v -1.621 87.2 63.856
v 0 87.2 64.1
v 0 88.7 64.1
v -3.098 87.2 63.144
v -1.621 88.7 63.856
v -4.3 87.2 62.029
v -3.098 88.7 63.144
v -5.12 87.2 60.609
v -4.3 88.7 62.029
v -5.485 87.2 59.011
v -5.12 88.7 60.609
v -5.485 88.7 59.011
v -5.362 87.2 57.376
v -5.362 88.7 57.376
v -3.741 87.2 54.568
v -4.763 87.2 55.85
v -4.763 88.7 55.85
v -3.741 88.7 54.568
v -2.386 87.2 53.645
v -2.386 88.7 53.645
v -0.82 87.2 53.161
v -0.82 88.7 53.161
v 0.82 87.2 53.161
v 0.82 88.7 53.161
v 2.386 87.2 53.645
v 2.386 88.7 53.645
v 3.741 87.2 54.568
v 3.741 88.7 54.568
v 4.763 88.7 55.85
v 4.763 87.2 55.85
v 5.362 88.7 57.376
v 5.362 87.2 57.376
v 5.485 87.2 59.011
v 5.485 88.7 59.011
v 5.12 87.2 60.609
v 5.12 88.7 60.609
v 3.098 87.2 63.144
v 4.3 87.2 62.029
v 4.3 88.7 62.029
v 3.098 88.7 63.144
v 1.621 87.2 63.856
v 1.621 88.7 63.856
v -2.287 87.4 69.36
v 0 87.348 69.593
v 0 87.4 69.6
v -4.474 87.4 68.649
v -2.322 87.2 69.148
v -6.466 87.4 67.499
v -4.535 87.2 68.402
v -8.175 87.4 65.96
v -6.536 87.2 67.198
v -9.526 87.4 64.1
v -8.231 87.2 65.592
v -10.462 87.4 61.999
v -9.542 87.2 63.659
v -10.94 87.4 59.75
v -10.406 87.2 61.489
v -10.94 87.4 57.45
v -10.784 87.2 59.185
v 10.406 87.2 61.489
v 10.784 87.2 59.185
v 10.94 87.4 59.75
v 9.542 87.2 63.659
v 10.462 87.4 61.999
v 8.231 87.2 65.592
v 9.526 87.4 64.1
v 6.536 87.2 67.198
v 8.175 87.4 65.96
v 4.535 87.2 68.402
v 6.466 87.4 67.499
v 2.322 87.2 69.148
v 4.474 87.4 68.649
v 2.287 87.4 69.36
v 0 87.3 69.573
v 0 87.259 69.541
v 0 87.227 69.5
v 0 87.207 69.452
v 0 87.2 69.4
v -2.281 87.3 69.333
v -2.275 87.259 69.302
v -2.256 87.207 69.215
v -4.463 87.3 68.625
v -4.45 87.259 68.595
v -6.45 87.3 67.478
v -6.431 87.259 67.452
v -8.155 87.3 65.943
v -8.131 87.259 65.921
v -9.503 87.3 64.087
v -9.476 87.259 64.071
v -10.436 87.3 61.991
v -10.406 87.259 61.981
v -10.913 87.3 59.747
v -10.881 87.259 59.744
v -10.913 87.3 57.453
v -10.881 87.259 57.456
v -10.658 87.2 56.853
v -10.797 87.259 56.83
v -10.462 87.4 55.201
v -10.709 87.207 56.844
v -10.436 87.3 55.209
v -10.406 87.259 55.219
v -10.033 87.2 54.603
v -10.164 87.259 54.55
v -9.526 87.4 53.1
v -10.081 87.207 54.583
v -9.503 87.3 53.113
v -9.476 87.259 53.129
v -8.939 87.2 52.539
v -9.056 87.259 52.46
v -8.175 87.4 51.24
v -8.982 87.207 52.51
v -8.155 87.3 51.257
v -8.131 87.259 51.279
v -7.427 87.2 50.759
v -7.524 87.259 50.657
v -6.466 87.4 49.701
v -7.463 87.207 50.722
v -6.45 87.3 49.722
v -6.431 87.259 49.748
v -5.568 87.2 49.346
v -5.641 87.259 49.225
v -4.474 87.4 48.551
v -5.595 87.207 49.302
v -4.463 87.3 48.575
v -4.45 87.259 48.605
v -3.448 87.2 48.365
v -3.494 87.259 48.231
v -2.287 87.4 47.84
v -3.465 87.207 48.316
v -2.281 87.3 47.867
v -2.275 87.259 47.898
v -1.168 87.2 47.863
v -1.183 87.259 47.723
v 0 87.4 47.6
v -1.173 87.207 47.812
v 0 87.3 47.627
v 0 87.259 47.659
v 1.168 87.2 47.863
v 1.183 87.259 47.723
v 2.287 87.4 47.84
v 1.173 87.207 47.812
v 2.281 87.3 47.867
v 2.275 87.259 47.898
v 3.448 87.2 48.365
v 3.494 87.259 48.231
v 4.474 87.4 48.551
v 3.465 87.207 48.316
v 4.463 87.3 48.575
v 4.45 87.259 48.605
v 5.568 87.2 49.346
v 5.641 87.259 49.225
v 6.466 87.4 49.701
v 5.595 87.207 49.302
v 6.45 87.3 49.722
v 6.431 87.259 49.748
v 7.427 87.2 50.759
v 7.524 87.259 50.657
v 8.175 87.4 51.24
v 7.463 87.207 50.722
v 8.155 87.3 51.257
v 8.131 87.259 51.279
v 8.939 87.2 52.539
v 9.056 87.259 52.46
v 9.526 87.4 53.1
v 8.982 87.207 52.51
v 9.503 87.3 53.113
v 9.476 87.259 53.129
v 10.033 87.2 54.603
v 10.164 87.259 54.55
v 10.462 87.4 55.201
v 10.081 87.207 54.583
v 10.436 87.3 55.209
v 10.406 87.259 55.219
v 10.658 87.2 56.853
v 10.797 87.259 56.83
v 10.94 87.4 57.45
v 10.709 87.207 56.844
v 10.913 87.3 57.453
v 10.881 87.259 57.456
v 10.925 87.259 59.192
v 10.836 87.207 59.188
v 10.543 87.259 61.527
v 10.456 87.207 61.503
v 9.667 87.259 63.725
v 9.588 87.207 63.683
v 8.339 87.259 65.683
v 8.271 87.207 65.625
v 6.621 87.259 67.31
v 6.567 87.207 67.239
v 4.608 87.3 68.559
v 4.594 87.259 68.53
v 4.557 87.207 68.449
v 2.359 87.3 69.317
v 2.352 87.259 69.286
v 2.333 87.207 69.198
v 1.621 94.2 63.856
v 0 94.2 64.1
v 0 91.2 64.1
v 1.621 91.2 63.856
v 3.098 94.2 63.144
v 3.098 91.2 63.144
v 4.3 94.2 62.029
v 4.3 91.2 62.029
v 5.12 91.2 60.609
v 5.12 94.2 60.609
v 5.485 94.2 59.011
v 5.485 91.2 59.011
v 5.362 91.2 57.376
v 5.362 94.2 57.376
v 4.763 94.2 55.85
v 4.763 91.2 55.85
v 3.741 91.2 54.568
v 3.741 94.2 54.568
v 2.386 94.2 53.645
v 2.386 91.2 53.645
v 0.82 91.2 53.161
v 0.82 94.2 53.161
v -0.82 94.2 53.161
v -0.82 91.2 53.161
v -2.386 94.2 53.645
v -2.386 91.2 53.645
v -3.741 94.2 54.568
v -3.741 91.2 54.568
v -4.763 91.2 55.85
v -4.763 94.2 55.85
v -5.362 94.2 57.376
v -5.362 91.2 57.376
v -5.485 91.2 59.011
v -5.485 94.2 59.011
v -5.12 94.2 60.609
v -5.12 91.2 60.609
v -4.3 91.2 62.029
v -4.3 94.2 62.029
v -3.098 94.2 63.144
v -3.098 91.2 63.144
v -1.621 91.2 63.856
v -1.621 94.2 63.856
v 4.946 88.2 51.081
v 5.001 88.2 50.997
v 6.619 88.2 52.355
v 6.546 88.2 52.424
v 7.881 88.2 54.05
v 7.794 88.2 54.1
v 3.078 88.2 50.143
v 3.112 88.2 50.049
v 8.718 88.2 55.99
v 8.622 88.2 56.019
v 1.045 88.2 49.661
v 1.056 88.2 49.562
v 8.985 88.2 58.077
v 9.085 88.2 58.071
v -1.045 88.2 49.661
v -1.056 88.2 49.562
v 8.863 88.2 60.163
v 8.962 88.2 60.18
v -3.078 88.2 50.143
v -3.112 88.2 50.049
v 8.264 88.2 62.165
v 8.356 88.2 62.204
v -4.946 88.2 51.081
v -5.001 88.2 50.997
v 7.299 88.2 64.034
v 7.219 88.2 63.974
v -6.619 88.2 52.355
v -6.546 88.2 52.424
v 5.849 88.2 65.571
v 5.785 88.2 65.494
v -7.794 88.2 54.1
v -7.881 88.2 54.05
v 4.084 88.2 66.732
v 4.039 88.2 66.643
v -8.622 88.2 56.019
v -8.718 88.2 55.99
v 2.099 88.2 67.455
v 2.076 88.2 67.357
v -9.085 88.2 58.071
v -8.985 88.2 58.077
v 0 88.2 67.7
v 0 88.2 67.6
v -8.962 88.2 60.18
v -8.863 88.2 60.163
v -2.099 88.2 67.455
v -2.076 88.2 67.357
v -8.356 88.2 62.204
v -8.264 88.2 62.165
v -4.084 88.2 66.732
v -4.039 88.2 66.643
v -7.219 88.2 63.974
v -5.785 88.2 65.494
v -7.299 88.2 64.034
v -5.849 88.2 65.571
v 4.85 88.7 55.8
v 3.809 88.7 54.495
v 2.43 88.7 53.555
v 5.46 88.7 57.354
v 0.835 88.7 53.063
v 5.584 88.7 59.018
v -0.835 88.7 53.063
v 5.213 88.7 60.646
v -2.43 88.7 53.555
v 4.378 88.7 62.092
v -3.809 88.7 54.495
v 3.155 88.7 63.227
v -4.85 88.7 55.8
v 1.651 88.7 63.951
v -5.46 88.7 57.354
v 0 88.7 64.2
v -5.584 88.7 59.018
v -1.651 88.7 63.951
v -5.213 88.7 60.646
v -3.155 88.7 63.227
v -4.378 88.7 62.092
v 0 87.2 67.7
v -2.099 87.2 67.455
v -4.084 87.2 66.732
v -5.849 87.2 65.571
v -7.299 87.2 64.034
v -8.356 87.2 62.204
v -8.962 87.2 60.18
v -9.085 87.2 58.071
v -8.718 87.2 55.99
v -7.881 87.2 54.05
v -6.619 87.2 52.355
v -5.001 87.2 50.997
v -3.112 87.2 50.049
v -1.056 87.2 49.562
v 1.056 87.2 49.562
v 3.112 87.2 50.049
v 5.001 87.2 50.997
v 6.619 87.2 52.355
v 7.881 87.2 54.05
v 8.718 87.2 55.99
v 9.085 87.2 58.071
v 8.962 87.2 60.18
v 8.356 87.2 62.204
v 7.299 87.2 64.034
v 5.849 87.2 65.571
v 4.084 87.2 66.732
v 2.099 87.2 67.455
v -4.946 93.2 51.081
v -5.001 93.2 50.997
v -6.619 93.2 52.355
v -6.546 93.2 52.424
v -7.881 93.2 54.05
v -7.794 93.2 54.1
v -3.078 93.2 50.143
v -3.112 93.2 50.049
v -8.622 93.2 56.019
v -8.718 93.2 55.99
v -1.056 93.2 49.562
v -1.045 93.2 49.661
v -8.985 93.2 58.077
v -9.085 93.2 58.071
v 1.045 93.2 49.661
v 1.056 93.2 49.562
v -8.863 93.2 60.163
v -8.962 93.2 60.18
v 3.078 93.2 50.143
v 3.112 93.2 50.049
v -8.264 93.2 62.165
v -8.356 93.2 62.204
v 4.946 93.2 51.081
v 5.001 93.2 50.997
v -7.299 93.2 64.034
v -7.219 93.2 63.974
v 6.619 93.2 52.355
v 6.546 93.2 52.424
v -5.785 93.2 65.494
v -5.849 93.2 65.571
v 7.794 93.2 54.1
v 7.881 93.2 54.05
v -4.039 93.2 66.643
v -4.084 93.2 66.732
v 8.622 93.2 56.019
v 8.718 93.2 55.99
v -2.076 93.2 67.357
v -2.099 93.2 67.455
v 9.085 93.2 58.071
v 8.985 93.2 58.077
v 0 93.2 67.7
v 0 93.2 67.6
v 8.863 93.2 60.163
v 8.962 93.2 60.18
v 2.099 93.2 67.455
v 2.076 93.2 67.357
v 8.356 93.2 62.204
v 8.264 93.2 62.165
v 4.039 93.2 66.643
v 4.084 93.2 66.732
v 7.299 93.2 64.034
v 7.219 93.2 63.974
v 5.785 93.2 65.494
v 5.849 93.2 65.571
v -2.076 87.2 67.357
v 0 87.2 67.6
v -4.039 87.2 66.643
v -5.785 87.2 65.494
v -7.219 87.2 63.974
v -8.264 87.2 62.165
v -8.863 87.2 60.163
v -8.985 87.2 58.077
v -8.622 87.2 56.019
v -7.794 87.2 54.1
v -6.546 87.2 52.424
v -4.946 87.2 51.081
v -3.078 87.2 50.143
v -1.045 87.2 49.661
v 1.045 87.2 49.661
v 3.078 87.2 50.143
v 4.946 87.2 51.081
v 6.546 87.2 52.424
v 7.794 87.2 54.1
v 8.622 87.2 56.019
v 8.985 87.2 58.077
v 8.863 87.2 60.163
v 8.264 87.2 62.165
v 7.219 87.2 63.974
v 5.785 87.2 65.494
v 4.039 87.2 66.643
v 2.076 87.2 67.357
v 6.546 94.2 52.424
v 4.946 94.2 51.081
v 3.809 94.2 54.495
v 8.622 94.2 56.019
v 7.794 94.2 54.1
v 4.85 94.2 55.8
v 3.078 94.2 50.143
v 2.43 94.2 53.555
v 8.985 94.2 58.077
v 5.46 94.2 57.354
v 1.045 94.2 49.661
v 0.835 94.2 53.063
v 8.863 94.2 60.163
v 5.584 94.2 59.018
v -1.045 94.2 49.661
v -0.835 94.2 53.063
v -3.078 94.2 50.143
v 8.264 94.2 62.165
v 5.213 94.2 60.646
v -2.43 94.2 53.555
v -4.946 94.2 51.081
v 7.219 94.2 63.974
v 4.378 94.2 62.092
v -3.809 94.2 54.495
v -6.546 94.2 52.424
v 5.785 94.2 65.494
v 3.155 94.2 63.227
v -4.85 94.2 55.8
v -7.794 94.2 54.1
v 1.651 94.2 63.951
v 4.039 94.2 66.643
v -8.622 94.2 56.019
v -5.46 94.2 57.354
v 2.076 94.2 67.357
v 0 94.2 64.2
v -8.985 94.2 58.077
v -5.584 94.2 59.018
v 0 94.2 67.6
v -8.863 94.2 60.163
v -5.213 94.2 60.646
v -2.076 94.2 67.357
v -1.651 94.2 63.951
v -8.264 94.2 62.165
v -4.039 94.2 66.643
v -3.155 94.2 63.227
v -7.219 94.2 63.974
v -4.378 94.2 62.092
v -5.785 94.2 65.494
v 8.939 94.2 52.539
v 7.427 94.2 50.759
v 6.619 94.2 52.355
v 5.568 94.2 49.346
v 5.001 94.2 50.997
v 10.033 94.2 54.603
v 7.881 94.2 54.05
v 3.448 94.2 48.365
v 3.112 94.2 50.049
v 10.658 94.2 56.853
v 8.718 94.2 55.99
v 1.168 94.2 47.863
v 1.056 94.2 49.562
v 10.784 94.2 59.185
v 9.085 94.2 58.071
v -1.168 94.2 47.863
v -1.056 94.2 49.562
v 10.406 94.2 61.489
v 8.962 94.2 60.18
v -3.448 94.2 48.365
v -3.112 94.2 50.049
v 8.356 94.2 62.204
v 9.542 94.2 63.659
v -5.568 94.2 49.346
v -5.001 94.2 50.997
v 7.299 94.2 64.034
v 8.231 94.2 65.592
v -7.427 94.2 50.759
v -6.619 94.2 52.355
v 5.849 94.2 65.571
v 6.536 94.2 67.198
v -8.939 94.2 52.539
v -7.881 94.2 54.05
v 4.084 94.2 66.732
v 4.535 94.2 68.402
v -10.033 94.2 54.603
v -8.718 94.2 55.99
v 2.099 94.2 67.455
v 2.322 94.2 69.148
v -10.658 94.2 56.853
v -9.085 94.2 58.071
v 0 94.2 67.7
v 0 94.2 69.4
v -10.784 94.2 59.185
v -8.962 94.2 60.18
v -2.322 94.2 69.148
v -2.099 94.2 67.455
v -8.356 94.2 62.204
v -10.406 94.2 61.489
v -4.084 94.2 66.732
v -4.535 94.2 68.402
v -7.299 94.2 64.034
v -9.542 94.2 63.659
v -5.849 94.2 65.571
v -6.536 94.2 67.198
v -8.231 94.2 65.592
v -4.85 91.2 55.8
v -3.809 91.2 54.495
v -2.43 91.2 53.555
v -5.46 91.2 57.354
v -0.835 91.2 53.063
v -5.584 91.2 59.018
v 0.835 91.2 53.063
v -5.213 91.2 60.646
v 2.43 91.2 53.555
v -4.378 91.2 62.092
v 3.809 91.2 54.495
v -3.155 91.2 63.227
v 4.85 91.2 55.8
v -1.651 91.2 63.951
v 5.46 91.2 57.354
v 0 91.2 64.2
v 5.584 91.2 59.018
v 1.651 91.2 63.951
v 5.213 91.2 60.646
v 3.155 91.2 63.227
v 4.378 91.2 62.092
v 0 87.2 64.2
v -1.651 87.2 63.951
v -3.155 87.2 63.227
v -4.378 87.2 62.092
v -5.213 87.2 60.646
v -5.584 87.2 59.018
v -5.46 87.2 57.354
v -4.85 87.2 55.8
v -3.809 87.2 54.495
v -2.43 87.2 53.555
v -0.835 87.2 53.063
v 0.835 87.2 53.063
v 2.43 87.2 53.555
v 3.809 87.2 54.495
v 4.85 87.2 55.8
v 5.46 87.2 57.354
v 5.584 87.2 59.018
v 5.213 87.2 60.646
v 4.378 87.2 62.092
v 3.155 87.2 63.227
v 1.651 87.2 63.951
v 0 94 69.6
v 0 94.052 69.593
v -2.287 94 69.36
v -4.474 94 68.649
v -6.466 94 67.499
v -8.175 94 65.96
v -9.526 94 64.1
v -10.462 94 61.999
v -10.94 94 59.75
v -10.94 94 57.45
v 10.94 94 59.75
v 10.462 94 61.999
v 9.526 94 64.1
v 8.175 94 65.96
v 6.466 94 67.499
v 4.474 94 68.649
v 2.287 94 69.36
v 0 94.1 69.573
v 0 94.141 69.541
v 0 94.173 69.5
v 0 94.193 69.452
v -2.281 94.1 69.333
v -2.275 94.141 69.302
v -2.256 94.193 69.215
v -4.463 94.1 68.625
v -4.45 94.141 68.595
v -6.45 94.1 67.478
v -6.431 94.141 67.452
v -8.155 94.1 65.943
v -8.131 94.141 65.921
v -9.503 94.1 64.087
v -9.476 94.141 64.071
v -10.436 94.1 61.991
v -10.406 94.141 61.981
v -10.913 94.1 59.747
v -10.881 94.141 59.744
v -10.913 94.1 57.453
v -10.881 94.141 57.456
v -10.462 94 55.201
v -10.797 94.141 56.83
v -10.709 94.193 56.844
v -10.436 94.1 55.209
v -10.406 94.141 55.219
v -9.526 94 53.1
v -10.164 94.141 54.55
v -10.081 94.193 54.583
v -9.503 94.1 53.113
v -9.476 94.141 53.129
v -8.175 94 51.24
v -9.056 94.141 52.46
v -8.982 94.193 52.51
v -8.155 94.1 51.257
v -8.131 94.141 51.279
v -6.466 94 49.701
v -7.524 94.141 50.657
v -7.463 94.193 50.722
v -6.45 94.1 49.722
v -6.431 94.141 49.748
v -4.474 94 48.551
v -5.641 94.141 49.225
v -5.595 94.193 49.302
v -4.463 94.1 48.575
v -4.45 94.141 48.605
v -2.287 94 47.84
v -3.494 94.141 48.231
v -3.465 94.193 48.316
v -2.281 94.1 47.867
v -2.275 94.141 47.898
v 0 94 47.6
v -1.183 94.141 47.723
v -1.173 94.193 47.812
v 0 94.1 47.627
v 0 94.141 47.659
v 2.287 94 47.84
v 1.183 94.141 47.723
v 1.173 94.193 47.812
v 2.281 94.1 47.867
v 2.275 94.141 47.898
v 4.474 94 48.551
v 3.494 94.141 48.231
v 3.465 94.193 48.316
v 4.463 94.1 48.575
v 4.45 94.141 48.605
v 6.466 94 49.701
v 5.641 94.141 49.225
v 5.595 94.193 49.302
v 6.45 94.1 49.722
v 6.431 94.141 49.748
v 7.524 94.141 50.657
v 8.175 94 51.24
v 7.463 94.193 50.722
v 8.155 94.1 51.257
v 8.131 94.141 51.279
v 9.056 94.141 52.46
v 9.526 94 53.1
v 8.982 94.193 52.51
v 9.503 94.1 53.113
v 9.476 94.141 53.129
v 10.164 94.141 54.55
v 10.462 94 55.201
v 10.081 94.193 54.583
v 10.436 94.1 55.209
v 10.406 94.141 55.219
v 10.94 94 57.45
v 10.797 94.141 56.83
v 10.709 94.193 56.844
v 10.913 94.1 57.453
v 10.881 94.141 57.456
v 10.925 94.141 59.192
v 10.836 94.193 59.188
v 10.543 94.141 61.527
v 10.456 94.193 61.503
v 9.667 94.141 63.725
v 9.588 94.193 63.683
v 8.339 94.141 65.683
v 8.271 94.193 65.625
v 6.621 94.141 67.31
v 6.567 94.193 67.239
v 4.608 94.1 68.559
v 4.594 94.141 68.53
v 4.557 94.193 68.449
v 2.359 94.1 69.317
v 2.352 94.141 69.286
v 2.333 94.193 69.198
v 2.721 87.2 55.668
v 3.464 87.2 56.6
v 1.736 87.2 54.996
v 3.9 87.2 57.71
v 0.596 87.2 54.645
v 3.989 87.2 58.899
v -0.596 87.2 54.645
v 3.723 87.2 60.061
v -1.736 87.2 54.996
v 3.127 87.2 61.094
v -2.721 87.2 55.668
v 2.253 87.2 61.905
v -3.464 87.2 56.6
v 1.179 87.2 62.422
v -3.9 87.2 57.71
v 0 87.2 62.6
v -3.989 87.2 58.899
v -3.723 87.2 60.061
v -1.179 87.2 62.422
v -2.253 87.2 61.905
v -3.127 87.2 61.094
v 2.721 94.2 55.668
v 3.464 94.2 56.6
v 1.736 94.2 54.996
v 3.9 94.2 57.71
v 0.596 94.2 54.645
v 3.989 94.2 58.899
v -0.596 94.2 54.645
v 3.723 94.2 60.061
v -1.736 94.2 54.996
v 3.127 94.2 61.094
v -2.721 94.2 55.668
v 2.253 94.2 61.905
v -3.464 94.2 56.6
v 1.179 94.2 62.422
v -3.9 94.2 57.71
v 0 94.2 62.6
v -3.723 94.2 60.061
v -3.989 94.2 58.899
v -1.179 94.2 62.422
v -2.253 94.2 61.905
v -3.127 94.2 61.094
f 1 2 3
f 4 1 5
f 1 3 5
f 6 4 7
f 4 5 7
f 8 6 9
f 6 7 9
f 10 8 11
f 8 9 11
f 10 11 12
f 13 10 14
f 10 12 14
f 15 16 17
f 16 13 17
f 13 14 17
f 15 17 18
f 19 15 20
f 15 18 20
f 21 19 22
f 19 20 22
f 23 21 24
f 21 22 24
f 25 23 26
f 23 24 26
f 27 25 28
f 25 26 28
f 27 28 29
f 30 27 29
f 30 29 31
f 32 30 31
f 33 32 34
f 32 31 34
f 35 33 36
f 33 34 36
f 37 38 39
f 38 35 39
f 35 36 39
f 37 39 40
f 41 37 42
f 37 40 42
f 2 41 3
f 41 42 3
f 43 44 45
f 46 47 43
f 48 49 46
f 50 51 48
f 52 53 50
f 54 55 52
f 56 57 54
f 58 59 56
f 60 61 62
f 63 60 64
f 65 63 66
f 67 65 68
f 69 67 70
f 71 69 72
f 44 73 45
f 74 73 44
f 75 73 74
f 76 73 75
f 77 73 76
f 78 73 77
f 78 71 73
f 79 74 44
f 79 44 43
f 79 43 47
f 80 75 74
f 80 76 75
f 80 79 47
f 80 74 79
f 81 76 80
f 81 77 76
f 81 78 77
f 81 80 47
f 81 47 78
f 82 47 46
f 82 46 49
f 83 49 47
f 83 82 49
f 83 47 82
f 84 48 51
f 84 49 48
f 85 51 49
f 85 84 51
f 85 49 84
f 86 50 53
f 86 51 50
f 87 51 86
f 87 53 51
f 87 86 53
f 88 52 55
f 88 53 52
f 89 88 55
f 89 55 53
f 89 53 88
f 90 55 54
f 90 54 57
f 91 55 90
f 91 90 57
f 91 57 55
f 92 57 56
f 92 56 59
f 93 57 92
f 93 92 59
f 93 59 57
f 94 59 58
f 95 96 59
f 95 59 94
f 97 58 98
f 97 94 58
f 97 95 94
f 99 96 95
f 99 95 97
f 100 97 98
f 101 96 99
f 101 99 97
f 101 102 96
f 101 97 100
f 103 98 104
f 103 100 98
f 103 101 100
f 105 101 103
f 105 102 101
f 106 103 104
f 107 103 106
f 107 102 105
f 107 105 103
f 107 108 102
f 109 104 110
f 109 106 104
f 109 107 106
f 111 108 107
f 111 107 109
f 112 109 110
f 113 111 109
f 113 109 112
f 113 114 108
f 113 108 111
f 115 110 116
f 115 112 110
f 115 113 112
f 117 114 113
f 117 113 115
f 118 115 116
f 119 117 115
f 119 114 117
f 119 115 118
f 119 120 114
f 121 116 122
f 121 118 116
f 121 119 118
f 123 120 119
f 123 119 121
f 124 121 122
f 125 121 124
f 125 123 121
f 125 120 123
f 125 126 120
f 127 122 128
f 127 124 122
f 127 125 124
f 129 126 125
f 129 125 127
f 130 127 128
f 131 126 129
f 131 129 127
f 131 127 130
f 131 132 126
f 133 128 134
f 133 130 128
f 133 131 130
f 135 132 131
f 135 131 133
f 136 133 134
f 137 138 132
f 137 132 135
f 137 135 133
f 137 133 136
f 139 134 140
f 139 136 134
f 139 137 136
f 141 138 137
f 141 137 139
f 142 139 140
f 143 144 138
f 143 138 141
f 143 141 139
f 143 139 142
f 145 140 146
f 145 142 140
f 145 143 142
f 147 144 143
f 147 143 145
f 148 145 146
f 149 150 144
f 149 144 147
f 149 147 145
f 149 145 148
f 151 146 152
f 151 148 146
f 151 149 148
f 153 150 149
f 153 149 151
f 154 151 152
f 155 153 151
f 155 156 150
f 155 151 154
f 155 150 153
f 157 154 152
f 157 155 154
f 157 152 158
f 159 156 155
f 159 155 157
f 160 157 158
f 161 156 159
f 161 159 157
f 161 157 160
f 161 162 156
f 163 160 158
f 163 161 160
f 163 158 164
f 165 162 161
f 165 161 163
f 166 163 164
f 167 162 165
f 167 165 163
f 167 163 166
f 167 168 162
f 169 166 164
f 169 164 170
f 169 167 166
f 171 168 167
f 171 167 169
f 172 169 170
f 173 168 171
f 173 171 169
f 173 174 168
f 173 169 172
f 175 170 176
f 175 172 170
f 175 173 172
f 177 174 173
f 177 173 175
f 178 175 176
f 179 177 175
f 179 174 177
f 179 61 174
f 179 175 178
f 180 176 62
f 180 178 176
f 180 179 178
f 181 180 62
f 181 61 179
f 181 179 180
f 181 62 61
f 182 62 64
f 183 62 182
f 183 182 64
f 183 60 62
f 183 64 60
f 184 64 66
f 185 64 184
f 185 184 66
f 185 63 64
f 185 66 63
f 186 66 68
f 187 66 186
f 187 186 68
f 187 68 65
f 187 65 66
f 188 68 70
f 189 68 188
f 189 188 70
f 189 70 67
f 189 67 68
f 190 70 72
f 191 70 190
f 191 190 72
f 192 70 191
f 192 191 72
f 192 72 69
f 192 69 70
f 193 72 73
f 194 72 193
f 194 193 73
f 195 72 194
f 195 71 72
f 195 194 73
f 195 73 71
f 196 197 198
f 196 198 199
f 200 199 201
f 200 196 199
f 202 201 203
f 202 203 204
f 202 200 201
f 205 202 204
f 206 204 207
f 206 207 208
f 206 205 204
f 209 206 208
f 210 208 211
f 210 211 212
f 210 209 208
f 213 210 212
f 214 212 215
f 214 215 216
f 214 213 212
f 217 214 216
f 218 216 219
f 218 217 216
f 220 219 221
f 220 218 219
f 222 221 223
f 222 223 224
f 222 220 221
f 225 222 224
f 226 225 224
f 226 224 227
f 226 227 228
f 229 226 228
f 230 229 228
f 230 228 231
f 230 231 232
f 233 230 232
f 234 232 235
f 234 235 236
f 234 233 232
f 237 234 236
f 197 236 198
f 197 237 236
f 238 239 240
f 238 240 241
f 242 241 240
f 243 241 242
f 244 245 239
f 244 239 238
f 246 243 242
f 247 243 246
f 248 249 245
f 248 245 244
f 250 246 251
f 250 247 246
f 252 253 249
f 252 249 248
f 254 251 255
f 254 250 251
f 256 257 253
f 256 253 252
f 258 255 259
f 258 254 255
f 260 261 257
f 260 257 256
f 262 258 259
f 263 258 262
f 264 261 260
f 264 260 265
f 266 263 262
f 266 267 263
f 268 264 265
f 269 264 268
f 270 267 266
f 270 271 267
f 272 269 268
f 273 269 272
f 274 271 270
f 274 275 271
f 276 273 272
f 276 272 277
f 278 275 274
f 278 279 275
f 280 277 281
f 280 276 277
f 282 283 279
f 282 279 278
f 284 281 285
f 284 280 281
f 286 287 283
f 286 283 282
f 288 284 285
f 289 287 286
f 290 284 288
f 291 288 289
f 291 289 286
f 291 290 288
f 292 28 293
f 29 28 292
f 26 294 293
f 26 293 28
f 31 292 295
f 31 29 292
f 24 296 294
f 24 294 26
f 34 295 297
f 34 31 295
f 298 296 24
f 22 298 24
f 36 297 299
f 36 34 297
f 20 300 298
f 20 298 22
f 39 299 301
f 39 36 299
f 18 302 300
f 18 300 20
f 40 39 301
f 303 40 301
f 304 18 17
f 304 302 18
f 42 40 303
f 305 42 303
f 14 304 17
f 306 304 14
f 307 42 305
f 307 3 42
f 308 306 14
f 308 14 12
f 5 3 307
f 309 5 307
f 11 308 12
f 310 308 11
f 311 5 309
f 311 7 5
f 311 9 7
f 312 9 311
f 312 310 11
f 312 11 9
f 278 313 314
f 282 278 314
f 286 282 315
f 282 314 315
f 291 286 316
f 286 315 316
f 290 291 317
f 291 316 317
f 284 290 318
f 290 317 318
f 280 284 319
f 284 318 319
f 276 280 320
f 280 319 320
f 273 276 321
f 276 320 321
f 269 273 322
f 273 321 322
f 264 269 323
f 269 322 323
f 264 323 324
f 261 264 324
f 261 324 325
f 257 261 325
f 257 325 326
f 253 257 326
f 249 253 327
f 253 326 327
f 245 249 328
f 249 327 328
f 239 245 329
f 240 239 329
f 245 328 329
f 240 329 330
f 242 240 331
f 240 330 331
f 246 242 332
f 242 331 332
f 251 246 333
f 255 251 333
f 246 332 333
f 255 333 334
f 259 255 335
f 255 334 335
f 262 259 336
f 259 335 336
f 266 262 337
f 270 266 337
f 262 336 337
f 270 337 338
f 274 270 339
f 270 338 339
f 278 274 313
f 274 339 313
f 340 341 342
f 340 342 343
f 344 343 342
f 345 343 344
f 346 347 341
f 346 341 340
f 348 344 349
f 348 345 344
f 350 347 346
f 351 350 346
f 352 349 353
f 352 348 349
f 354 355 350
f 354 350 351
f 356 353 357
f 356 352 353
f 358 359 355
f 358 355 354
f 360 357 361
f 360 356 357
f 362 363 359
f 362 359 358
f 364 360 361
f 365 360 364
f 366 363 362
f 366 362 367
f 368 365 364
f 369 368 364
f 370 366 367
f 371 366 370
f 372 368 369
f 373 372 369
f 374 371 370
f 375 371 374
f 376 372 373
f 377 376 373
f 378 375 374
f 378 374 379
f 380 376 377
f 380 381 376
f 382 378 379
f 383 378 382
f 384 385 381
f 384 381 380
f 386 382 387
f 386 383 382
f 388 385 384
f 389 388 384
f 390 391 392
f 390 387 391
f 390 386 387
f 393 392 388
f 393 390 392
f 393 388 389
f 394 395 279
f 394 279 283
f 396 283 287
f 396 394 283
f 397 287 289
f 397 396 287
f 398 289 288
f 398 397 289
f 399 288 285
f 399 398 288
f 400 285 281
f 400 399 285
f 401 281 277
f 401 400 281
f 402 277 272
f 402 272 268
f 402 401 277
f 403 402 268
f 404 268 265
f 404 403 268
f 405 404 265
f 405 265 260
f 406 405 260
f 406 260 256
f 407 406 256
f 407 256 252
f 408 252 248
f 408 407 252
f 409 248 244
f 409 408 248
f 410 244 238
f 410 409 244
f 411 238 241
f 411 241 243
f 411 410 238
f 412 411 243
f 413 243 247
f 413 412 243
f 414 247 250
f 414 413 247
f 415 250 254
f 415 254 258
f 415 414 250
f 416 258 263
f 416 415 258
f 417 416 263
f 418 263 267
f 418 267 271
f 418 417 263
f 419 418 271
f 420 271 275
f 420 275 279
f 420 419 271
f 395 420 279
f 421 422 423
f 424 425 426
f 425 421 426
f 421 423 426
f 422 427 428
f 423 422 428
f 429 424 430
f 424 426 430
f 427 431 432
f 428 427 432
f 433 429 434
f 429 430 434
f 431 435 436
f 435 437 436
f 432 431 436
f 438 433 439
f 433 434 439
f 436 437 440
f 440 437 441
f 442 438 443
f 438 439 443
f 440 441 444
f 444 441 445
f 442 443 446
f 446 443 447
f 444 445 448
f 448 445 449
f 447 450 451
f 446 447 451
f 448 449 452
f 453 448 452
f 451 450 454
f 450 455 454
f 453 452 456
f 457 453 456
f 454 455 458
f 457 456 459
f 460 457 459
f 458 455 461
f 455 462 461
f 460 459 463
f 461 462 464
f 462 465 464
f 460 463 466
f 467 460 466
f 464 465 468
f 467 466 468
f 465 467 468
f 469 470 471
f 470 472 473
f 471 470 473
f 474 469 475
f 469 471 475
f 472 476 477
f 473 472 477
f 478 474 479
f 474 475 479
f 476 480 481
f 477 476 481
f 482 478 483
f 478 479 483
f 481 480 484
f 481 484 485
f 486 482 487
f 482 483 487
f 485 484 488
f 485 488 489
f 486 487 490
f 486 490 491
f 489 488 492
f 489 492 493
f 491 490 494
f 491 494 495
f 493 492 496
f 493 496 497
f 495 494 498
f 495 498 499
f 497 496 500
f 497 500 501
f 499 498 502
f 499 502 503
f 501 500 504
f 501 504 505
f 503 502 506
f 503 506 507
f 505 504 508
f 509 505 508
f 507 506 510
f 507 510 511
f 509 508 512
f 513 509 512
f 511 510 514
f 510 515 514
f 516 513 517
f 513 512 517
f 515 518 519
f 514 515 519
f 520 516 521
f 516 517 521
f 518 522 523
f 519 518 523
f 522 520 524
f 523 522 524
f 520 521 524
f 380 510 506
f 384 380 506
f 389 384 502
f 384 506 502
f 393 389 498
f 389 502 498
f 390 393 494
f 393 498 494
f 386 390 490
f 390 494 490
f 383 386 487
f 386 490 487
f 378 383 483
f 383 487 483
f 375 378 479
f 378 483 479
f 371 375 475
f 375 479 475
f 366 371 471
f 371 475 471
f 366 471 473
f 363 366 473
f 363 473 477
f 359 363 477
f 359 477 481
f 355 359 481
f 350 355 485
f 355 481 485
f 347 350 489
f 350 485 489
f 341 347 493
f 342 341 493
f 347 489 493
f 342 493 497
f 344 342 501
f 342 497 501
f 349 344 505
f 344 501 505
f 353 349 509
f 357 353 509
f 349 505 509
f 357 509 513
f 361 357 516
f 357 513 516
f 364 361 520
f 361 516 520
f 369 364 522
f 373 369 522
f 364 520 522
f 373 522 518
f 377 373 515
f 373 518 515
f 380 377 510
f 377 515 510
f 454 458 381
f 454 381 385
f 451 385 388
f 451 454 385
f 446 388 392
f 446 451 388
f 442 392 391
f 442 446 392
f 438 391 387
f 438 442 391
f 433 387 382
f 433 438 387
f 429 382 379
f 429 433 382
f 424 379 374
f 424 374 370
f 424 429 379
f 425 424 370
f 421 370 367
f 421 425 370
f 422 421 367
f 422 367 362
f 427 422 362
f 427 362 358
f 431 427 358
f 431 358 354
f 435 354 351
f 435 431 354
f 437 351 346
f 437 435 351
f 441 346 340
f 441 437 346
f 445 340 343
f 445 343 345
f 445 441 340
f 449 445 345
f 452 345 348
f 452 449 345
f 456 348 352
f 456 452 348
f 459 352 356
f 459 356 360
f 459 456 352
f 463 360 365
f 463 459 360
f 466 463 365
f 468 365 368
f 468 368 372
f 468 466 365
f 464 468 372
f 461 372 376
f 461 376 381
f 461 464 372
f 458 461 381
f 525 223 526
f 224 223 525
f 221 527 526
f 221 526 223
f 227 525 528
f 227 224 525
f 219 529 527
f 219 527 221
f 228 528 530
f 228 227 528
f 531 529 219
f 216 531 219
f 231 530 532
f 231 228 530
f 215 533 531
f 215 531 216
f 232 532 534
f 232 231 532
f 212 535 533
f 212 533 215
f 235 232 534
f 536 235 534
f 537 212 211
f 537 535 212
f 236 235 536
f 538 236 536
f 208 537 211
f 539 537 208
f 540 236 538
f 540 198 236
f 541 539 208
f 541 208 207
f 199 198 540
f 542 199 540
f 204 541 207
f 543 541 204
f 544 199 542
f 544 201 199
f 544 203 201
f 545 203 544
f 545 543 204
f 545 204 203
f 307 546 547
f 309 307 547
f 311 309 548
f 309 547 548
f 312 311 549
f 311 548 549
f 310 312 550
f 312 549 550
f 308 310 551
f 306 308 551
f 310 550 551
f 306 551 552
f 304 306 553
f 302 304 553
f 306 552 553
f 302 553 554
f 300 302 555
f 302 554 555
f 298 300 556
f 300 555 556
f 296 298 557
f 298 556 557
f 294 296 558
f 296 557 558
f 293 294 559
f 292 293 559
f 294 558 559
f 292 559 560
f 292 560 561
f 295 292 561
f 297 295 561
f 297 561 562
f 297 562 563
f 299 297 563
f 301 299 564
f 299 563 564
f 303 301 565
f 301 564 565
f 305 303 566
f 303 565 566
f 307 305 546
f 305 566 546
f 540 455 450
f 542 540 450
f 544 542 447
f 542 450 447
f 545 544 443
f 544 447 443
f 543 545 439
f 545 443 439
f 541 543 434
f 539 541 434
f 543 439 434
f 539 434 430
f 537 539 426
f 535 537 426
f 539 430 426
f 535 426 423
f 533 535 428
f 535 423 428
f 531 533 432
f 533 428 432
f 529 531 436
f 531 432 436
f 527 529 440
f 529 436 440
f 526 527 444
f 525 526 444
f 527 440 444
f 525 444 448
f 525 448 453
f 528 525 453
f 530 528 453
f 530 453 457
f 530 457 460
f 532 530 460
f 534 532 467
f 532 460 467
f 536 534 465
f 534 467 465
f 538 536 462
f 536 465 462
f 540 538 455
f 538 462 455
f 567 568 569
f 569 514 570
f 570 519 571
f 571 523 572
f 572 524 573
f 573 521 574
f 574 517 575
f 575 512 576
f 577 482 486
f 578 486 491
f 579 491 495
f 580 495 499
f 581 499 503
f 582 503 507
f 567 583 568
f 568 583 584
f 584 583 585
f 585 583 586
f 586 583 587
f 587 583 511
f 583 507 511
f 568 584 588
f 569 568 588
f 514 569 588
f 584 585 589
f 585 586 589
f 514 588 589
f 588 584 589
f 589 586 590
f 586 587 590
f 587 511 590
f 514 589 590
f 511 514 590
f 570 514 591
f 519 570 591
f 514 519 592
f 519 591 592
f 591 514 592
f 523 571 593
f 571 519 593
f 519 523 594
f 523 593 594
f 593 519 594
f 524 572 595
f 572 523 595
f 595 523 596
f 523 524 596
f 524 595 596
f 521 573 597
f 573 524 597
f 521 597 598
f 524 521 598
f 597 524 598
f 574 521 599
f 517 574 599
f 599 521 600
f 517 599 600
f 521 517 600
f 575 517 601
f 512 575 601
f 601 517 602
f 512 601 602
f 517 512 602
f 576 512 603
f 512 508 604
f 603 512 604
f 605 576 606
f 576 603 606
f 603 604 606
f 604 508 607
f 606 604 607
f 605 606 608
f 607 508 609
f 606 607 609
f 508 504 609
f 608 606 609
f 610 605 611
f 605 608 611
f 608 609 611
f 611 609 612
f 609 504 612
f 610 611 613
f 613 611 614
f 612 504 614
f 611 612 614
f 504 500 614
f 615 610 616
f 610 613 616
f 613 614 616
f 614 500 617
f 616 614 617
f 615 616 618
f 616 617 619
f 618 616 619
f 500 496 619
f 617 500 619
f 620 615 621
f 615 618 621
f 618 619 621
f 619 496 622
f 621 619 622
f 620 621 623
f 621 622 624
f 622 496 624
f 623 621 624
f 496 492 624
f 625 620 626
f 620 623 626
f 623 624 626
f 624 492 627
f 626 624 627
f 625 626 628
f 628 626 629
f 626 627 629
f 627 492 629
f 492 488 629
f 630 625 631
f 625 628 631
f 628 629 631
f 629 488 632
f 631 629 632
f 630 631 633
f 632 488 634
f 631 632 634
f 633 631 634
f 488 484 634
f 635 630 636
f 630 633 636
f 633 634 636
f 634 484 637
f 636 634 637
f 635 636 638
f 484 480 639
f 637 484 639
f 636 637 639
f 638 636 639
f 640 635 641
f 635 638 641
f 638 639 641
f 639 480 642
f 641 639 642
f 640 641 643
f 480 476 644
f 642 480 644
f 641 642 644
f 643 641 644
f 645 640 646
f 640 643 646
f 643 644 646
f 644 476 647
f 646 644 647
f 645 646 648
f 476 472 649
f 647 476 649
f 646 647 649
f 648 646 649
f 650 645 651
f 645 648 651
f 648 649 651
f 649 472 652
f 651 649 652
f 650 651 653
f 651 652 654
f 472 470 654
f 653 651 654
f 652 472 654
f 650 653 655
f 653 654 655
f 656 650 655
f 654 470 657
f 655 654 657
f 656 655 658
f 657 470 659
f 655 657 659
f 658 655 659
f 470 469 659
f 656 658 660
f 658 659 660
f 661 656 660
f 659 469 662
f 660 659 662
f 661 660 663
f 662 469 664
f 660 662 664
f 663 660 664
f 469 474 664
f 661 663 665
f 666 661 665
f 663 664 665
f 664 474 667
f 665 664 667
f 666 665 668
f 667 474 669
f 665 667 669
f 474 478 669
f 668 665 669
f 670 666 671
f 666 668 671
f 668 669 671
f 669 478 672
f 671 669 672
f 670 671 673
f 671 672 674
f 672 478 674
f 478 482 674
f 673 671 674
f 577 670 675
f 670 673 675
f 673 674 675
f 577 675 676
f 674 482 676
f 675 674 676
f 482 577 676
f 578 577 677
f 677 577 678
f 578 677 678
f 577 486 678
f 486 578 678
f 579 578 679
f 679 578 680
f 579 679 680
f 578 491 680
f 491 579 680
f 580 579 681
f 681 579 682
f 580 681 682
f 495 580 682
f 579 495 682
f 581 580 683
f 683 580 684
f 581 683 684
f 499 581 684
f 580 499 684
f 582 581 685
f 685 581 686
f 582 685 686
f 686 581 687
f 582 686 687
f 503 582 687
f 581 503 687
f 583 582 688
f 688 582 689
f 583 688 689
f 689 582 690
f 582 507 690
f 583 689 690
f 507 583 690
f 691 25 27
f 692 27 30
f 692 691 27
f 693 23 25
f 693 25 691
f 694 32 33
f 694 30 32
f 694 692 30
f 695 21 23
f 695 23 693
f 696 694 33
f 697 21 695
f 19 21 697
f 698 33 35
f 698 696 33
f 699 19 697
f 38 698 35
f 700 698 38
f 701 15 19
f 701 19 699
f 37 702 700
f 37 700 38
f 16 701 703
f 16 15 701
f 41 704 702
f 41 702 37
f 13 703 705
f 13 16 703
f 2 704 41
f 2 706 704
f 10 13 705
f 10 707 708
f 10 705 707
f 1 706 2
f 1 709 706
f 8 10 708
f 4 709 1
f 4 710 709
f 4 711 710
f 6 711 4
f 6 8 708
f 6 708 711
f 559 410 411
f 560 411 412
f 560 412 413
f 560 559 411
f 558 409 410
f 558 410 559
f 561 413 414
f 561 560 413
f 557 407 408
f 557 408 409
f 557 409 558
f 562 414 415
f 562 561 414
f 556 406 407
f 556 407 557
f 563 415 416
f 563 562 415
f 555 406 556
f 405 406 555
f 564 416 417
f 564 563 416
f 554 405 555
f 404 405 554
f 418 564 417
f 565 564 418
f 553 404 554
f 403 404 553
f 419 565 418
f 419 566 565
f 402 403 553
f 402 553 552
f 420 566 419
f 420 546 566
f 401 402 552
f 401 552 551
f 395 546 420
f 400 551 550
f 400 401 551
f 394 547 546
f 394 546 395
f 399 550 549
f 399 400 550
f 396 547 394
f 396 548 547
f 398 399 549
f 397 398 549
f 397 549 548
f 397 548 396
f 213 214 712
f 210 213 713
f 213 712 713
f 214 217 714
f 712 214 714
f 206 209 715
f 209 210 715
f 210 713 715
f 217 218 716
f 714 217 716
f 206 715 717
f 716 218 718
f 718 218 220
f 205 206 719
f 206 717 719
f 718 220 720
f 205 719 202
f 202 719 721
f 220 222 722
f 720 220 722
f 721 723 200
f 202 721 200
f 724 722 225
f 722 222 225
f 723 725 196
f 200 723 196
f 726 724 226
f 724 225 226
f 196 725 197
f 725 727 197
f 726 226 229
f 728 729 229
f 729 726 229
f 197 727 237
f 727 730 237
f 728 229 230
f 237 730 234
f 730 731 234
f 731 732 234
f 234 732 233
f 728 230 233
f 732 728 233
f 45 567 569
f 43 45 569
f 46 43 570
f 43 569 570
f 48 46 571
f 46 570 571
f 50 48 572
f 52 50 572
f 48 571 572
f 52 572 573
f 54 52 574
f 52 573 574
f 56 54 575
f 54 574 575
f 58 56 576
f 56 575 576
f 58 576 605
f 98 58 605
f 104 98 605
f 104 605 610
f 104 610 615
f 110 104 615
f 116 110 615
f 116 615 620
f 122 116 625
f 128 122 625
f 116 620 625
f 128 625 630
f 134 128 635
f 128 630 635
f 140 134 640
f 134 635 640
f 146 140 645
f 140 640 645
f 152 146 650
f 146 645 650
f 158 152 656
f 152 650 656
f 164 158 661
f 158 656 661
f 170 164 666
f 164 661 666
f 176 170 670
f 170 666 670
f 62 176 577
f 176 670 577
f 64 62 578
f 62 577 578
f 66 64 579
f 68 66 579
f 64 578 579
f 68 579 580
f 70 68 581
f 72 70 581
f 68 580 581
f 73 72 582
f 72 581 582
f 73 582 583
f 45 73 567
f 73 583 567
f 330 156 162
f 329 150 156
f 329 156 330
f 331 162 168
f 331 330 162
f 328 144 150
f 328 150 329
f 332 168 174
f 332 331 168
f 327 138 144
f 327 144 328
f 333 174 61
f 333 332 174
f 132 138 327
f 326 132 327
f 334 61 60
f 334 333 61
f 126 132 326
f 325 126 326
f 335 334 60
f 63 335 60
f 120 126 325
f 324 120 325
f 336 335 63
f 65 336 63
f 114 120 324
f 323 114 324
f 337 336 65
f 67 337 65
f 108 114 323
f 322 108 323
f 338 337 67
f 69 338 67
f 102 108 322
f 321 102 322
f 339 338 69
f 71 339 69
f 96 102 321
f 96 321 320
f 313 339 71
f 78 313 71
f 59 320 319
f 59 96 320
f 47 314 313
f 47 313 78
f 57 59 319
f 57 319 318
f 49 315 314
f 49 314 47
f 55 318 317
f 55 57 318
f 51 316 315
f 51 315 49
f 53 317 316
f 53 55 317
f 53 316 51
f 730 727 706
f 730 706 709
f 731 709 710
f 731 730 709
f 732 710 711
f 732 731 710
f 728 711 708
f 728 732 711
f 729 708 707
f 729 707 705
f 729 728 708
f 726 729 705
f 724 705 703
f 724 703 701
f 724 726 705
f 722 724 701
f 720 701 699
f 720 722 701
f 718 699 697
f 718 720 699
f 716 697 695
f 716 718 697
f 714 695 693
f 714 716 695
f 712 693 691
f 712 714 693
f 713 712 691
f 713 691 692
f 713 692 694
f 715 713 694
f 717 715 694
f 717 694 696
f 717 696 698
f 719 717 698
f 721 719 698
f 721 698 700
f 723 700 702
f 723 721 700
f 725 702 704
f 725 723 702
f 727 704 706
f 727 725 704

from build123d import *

# Parameters (mm, degrees)
SKETCH033_R             = 11
SKETCH033_R_2           = 4
PAD012_DEPTH            = 7
SKETCH035_R             = 5.6
SKETCH035_R_2           = 5.5
POCKET016_DEPTH         = 1.5
SKETCH034_R             = 5.6
SKETCH034_R_2           = 5.5
POCKET019_DEPTH         = 3
SKETCH032_R             = 9.1
SKETCH032_R_2           = 9
POCKET018_DEPTH         = 1
SKETCH031_R             = 9.1
SKETCH031_R_2           = 9
POCKET017_DEPTH         = 1
FILLET002_R             = 0.2
BODY008_PITCH_ANGLE     = -90
BODY008_PLACEMENT_ANGLE = 90


with BuildPart() as part:
    # Sketch033 → Pad012 (new body)
    with BuildSketch(Plane.XY):
        Circle(SKETCH033_R)
        Circle(SKETCH033_R_2, mode=Mode.SUBTRACT)
    extrude(amount=PAD012_DEPTH)

    # Sketch035 (on Face4 of Pad012) → Pocket016 (cut, symmetric)
    with BuildSketch(Plane.XY.offset(7)):
        Circle(SKETCH035_R)
        Circle(SKETCH035_R_2, mode=Mode.SUBTRACT)
    extrude(amount=POCKET016_DEPTH, both=True, mode=Mode.SUBTRACT)

    # Sketch034 (on Face2 of Pocket016) → Pocket019 (cut)
    with BuildSketch(Plane(origin=(0, 0, 0), x_dir=(1, 0, 0), z_dir=(0, 0, -1))):
        Circle(SKETCH034_R)
        Circle(SKETCH034_R_2, mode=Mode.SUBTRACT)
    extrude(amount=-POCKET019_DEPTH, mode=Mode.SUBTRACT)

    # Sketch032 (on Face3 of Pocket019) → Pocket018 (cut)
    with BuildSketch(Plane.XY.offset(7)):
        Circle(SKETCH032_R)
        Circle(SKETCH032_R_2, mode=Mode.SUBTRACT)
    extrude(amount=-POCKET018_DEPTH, mode=Mode.SUBTRACT)

    # Sketch031 (on Face2 of Pocket018) → Pocket017 (cut)
    with BuildSketch(Plane(origin=(0, 0, 0), x_dir=(1, 0, 0), z_dir=(0, 0, -1))):
        Circle(SKETCH031_R)
        Circle(SKETCH031_R_2, mode=Mode.SUBTRACT)
    extrude(amount=-POCKET017_DEPTH, mode=Mode.SUBTRACT)

    # Fillet002
    fillet002_edges = [part.edges().sort_by_distance(p)[0] for p in [
        (-11, 0, 0),
        (-11, 0, 7),
    ]]
    fillet(fillet002_edges, radius=FILLET002_R)


with BuildPart() as part_1:
    # Body008 pitch: moved
    add(part.part.rotate(Axis((0, 0, 0), (0, 1, 0)), BODY008_PITCH_ANGLE))


with BuildPart() as part_2:
    # Body008 placement: moved
    add(part_1.part.moved(Location((0, 94.2, 58.6))).rotate(Axis((0, 94.2, 58.6), (0, 0, 1)), BODY008_PLACEMENT_ANGLE))


solid = part_2.part
